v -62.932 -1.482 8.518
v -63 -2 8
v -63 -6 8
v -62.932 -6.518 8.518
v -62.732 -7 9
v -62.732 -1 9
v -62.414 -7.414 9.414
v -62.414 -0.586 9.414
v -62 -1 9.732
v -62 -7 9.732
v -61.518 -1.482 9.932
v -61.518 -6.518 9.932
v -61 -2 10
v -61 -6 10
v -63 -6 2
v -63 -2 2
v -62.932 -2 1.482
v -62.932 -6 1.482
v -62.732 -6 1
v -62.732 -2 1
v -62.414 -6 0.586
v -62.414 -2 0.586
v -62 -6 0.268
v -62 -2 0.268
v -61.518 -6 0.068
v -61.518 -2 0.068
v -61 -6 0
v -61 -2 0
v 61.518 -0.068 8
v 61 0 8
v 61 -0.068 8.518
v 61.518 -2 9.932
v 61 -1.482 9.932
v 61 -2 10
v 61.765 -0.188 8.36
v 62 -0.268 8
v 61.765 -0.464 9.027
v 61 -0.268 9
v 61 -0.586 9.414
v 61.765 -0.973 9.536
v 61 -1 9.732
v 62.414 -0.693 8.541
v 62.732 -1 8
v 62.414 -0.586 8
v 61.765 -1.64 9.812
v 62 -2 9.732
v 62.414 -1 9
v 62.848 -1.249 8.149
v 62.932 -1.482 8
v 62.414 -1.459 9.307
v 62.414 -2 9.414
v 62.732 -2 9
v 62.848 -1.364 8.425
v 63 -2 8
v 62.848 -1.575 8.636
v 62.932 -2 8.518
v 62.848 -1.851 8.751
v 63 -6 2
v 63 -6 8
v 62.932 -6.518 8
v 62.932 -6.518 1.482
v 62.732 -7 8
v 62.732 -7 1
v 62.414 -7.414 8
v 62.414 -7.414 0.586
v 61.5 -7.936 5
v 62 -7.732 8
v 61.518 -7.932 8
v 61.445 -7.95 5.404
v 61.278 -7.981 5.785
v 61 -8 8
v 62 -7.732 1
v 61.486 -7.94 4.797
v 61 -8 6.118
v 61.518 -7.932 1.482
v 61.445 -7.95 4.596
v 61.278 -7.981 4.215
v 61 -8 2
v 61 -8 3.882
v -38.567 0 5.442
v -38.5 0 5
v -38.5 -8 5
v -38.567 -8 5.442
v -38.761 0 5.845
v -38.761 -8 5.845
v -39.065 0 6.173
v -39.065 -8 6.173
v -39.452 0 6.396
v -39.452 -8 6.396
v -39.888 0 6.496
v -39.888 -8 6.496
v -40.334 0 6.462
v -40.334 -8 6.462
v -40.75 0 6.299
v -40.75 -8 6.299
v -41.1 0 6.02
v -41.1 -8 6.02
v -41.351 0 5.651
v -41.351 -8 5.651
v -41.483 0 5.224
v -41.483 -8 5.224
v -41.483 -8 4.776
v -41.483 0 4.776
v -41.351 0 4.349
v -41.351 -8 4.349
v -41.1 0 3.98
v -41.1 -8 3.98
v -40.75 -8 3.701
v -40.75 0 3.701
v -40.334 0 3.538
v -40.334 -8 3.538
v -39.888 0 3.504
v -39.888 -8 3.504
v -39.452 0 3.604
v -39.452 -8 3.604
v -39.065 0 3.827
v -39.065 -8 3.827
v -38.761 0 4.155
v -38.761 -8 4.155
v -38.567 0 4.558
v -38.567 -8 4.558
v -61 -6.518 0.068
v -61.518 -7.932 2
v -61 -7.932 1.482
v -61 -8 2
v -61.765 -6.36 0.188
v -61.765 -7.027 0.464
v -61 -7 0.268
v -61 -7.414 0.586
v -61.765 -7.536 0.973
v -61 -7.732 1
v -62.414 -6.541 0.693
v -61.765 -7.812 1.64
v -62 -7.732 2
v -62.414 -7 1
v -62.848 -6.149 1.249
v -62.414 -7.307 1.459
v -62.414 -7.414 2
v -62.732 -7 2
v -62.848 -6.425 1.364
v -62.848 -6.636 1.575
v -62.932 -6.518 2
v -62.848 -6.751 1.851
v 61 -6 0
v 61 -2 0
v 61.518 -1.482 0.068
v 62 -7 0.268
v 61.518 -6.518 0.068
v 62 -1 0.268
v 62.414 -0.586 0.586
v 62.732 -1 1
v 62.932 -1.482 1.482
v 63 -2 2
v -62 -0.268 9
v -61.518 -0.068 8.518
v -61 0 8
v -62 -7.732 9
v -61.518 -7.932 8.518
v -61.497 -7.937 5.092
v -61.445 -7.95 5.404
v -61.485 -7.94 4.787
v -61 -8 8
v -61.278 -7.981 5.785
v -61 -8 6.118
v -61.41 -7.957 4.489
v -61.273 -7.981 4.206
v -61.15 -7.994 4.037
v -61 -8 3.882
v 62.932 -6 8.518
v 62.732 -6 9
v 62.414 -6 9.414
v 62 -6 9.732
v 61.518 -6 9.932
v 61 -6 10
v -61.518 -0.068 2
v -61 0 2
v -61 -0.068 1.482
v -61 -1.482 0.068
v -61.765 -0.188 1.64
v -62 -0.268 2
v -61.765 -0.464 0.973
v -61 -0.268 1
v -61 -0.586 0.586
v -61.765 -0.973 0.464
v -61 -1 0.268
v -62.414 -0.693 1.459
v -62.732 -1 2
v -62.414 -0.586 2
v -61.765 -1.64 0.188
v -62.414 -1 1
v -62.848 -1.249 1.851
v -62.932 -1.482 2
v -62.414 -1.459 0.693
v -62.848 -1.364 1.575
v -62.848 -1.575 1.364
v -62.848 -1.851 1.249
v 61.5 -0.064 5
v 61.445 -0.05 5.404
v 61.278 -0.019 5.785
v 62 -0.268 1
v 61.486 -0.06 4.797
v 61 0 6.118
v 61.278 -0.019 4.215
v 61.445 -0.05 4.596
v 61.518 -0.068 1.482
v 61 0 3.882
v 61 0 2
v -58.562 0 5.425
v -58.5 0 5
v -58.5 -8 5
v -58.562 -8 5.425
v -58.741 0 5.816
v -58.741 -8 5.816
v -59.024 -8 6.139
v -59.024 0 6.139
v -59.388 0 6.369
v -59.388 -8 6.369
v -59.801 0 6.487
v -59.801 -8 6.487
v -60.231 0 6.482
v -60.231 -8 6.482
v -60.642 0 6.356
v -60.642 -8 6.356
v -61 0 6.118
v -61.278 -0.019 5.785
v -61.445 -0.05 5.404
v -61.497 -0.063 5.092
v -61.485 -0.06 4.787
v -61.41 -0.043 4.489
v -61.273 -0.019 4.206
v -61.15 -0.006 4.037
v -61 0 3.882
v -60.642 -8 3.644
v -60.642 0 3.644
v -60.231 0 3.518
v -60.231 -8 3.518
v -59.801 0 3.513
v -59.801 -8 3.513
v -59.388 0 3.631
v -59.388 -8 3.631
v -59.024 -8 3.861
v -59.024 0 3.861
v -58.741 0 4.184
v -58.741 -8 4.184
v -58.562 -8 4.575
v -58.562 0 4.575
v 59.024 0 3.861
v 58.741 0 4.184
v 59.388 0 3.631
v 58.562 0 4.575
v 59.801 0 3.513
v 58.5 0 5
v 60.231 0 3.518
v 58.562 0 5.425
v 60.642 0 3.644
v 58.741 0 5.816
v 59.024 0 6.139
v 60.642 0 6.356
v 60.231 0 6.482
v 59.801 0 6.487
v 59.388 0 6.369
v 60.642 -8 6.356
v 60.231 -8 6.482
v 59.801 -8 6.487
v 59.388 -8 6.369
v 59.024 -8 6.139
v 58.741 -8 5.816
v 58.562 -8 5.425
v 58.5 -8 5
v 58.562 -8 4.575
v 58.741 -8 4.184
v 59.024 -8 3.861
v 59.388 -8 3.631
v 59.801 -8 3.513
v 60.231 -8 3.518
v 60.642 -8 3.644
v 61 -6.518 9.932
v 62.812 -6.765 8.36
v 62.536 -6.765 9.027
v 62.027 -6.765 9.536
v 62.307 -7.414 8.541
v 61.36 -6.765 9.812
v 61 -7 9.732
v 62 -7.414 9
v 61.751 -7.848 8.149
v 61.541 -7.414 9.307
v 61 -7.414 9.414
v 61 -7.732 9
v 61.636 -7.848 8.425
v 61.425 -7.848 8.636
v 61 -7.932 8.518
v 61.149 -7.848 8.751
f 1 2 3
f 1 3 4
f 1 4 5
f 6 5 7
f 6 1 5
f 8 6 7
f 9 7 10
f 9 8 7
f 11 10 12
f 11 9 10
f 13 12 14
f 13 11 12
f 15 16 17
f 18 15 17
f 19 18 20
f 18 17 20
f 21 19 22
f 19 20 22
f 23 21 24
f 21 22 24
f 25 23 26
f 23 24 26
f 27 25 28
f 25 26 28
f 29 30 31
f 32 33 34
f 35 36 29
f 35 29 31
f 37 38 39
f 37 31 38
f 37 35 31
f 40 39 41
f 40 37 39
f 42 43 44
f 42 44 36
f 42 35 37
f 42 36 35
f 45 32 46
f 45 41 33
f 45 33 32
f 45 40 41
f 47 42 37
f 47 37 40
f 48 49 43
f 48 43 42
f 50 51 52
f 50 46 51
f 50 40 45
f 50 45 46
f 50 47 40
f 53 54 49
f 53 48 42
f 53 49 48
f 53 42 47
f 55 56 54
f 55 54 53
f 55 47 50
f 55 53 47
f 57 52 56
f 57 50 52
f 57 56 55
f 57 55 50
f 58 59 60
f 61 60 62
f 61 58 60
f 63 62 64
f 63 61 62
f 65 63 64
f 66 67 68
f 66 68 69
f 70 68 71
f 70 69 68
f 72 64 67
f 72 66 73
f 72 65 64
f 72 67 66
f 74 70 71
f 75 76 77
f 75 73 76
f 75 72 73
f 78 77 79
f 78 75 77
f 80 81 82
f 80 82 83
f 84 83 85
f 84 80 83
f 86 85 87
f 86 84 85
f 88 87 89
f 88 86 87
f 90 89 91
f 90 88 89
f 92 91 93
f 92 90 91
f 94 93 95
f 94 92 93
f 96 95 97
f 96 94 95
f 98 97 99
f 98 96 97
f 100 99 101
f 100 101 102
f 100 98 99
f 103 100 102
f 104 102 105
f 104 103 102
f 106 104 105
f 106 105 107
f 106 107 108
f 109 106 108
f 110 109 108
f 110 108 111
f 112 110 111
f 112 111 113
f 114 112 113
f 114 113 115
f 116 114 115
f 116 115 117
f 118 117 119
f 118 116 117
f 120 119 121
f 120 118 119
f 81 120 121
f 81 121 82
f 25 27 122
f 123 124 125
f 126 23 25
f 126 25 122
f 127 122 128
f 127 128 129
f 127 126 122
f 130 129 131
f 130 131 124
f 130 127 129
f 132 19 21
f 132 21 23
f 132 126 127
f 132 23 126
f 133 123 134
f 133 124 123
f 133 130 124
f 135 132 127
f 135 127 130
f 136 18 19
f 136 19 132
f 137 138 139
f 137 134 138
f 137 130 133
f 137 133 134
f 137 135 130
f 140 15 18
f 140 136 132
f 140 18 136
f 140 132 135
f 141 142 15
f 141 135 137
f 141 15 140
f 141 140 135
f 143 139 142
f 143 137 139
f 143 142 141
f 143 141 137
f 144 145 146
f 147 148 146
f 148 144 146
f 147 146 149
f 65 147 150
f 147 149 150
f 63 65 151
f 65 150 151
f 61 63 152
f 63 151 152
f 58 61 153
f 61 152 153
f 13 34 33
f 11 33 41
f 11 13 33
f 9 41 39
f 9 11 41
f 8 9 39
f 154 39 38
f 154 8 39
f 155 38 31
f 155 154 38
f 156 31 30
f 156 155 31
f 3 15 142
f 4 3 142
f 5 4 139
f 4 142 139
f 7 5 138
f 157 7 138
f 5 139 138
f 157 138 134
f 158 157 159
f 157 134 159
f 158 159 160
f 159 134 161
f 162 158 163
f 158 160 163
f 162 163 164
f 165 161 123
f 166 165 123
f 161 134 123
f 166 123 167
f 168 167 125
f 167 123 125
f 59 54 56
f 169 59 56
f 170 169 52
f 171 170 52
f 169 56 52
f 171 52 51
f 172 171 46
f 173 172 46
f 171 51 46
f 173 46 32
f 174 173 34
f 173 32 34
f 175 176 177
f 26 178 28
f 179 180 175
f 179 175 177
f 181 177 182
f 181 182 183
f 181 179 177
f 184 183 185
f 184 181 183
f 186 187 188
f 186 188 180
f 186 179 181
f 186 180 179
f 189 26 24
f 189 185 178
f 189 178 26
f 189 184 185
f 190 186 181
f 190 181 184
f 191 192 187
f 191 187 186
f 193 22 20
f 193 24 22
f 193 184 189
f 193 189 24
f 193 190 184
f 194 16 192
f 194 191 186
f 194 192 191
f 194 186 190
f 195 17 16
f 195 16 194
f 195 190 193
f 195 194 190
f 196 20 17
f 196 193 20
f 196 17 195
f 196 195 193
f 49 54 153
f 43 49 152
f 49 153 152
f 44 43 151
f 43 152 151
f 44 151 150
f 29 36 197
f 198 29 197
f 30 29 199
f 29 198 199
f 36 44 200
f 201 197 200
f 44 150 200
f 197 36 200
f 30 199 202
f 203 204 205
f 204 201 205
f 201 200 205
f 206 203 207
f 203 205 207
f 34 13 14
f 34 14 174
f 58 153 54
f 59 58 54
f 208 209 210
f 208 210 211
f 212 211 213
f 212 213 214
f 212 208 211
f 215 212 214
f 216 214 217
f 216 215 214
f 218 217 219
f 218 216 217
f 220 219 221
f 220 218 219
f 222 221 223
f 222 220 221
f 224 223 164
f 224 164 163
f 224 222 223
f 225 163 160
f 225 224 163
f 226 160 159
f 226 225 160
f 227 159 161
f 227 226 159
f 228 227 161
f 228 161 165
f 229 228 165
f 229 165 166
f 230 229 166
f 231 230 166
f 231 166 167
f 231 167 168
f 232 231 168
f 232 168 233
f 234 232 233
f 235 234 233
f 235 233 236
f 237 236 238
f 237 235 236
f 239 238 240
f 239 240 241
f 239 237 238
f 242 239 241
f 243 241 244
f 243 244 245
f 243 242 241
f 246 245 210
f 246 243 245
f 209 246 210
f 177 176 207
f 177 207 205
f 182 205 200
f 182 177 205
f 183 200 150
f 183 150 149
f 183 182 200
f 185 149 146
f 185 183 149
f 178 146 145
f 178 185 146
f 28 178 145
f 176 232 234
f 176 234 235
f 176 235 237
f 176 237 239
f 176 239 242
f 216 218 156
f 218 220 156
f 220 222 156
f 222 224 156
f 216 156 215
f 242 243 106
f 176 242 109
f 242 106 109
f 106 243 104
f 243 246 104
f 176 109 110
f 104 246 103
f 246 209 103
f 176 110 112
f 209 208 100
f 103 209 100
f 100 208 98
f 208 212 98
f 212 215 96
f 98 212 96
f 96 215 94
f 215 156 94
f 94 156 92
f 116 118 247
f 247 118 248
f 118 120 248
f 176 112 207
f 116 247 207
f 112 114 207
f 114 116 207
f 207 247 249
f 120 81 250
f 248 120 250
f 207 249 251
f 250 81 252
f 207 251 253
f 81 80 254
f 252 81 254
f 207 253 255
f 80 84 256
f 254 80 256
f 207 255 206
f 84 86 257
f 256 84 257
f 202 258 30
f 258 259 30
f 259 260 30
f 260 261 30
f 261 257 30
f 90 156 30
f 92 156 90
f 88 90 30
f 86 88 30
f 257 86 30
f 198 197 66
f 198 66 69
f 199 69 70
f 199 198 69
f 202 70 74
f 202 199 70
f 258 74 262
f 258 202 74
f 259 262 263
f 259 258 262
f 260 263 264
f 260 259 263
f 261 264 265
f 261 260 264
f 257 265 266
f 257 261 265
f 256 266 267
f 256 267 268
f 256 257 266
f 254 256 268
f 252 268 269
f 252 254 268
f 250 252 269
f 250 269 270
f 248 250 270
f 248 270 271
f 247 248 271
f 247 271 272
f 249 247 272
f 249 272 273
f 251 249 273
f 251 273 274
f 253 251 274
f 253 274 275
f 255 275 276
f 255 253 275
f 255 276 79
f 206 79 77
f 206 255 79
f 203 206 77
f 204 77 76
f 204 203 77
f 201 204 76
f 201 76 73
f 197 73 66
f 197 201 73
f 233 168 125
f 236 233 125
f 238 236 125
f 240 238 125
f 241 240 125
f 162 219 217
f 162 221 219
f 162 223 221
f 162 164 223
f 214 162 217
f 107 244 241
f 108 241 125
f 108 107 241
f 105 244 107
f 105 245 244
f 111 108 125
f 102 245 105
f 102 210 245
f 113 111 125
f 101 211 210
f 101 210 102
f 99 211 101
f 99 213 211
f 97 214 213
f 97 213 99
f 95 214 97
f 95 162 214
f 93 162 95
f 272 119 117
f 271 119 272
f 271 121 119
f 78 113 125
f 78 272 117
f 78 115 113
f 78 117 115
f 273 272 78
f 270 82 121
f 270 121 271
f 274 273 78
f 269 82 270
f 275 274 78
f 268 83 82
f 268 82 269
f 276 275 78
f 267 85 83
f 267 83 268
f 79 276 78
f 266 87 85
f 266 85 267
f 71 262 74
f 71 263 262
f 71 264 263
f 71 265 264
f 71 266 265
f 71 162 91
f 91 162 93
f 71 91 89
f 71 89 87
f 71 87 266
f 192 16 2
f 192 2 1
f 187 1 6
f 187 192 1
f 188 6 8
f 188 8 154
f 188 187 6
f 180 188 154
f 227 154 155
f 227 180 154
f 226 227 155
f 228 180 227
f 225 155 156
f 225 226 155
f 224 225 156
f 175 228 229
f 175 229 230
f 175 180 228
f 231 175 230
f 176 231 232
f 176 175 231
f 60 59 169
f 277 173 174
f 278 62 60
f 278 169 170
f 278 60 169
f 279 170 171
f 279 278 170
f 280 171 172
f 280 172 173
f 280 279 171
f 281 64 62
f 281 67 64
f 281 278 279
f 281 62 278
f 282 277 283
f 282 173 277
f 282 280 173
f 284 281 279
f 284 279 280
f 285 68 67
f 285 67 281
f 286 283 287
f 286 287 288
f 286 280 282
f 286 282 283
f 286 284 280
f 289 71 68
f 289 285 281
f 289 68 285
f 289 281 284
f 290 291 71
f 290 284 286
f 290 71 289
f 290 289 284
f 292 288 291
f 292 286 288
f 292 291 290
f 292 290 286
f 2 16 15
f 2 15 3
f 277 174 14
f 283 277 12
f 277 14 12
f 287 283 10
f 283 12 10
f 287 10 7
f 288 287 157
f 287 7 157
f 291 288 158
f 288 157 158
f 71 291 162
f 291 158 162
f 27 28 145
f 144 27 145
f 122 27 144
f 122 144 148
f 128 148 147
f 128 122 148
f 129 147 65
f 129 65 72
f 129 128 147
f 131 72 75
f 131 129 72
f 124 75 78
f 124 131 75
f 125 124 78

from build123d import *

# Parameters (mm, degrees)
F0_W         = 126
F0_H         = 10
F0_R         = 1.5
F1_DEPTH     = 8
F2_T1_DEPTH  = 4
F2_T3_DEPTH  = 18
F2_T5_DEPTH  = 129
F2_T7_DEPTH  = 13
F2_S11_W     = 2
F2_S11_H     = 2
F2_T12_DEPTH = 2
F2_S17_W     = 2
F2_S17_H     = 2
F2_T18_DEPTH = 2
F3_T1_DEPTH  = 11
F3_T3_DEPTH  = 4
F3_T5_DEPTH  = 127
F3_S9_W      = 2.04
F3_S9_H      = 2.04
F3_T10_DEPTH = 2.04
F3_S15_W     = 2.04
F3_S15_H     = 2.04
F3_T16_DEPTH = 2.04


# Not quite as in the source:
# - a fillet or chamfer that OpenCascade refuses, or shapes differently, is made with other operations: its cross-section is extruded or revolved along the edge and cut away or added


with BuildPart() as f1:
    # F0 (on Front) → F1 (new body)
    with BuildSketch(Plane.XZ):
        with Locations((0, 5)):
            Rectangle(F0_W, F0_H)
        with Locations((-60, 5)):
            Circle(F0_R, mode=Mode.SUBTRACT)
        with Locations((-40, 5)):
            Circle(F0_R, mode=Mode.SUBTRACT)
        with Locations((60, 5)):
            Circle(F0_R, mode=Mode.SUBTRACT)
    extrude(amount=F1_DEPTH)

    # F2: fillet of radius 2 on 7 edges, made by hand

    # F2_s2 → F2_t1 (cut)
    with BuildSketch(Plane.XZ.offset(2)):
        with BuildLine():
            ThreePointArc((63, 8), (62.4142135624, 9.4142135624), (61, 10))
            Line((61, 10), (63, 10))
            Line((63, 10), (63, 8))
        make_face()
    extrude(amount=F2_T1_DEPTH, mode=Mode.SUBTRACT)

    # F2_s4 → F2_t3 (cut)
    with BuildSketch(Plane.XZ.offset(-5)):
        with BuildLine():
            ThreePointArc((-63, 8), (-62.4142135624, 9.4142135624), (-61, 10))
            Line((-61, 10), (-63, 10))
            Line((-63, 10), (-63, 8))
        make_face()
        with BuildLine():
            ThreePointArc((61, 0), (62.4142135624, 0.5857864376), (63, 2))
            Line((63, 2), (63, 0))
            Line((63, 0), (61, 0))
        make_face()
    extrude(amount=F2_T3_DEPTH, mode=Mode.SUBTRACT)

    # F2_s6 → F2_t5 (cut)
    with BuildSketch(Plane.YZ.offset(-68)):
        with BuildLine():
            ThreePointArc((-2, 10), (-0.5857864376, 9.4142135624), (0, 8))
            Line((0, 8), (0, 10))
            Line((0, 10), (-2, 10))
        make_face()
        with BuildLine():
            ThreePointArc((-6, 10), (-7.4142135624, 9.4142135624), (-8, 8))
            Line((-8, 8), (-8, 10))
            Line((-8, 10), (-6, 10))
        make_face()
    extrude(amount=F2_T5_DEPTH, mode=Mode.SUBTRACT)

    # F2_s8 → F2_t7 (cut)
    with BuildSketch(Plane.XY.offset(-5)):
        with BuildLine():
            ThreePointArc((63, -2), (62.4142135624, -0.5857864376), (61, 0))
            Line((61, 0), (63, 0))
            Line((63, 0), (63, -2))
        make_face()
        with BuildLine():
            ThreePointArc((63, -6), (62.4142135624, -7.4142135624), (61, -8))
            Line((61, -8), (63, -8))
            Line((63, -8), (63, -6))
        make_face()
    extrude(amount=F2_T7_DEPTH, mode=Mode.SUBTRACT)


with BuildPart() as f2_tool10:
    # F2_s11 → F2_t12 (new body)
    with BuildSketch(Plane.YZ.offset(61)):
        with Locations((-1, 9)):
            Rectangle(F2_S11_W, F2_S11_H)
    extrude(amount=F2_T12_DEPTH)

    # F2_s13 → F2_t14 (revolve, cut)
    with BuildSketch(Plane(origin=(61, -2, 8), x_dir=(0, -0.7071067812, -0.7071067812), z_dir=(0, -0.7071067812, 0.7071067812))):
        with BuildLine():
            ThreePointArc((0, -2), (2, 0), (0, 2))
            Line((0, 2), (0, -2))
        make_face()
    revolve(axis=Axis((61, -2, 8), (1, 0, 0)), mode=Mode.SUBTRACT)


with BuildPart() as f1_1:
    add(f1.part)

    # F2_t9: cut F2_tool10
    add(f2_tool10.part, mode=Mode.SUBTRACT)


with BuildPart() as f2_tool16:
    # F2_s17 → F2_t18 (new body)
    with BuildSketch(Plane.XZ.offset(6)):
        with Locations((62, 9)):
            Rectangle(F2_S17_W, F2_S17_H)
    extrude(amount=F2_T18_DEPTH)

    # F2_s19 → F2_t20 (revolve, cut)
    with BuildSketch(Plane(origin=(61, -6, 8), x_dir=(-0.7071067812, 0, -0.7071067812), z_dir=(-0.7071067812, 0, 0.7071067812))):
        with BuildLine():
            ThreePointArc((0, -2), (2, 0), (0, 2))
            Line((0, 2), (0, -2))
        make_face()
    revolve(axis=Axis((61, -6, 8), (0, -1, 0)), mode=Mode.SUBTRACT)


with BuildPart() as f1_2:
    add(f1_1.part)

    # F2_t15: cut F2_tool16
    add(f2_tool16.part, mode=Mode.SUBTRACT)

    # F3: fillet of radius 2 on 7 edges, made by hand

    # F3_s2 → F3_t1 (cut)
    with BuildSketch(Plane.XY.offset(2)):
        with BuildLine():
            ThreePointArc((-63, -2), (-62.4142135624, -0.5857864376), (-61, 0))
            Line((-61, 0), (-63, 0))
            Line((-63, 0), (-63, -2))
        make_face()
        with BuildLine():
            ThreePointArc((-63, -6), (-62.4142135624, -7.4142135624), (-61, -8))
            Line((-61, -8), (-63, -8))
            Line((-63, -8), (-63, -6))
        make_face()
    extrude(amount=F3_T1_DEPTH, mode=Mode.SUBTRACT)

    # F3_s4 → F3_t3 (cut)
    with BuildSketch(Plane.XZ.offset(2)):
        with BuildLine():
            ThreePointArc((-63, 2), (-62.4142135624, 0.5857864376), (-61, 0))
            Line((-61, 0), (-63, 0))
            Line((-63, 0), (-63, 2))
        make_face()
    extrude(amount=F3_T3_DEPTH, mode=Mode.SUBTRACT)

    # F3_s6 → F3_t5 (cut)
    with BuildSketch(Plane.YZ.offset(-61)):
        with BuildLine():
            ThreePointArc((0, 2), (-0.5857864376, 0.5857864376), (-2, 0))
            Line((-2, 0), (0, 0))
            Line((0, 0), (0, 2))
        make_face()
        with BuildLine():
            ThreePointArc((-6, 0), (-7.4142135624, 0.5857864376), (-8, 2))
            Line((-8, 2), (-8, 0))
            Line((-8, 0), (-6, 0))
        make_face()
    extrude(amount=F3_T5_DEPTH, mode=Mode.SUBTRACT)


with BuildPart() as f3_tool8:
    # F3_s9 → F3_t10 (new body)
    with BuildSketch(Plane.YZ.offset(-61)):
        with Locations((-0.98, 0.98)):
            Rectangle(F3_S9_W, F3_S9_H)
    extrude(amount=-F3_T10_DEPTH)

    # F3_s11 → F3_t12 (revolve, cut)
    with BuildSketch(Plane(origin=(-61, -2, 2), x_dir=(0, -0.7071067812, 0.7071067812), z_dir=(0, -0.7071067812, -0.7071067812))):
        with BuildLine():
            ThreePointArc((0, -2), (2, 0), (0, 2))
            Line((0, 2), (0, -2))
        make_face()
    revolve(axis=Axis((-61, -2, 2), (-1, 0, 0)), mode=Mode.SUBTRACT)


with BuildPart() as f1_3:
    add(f1_2.part)

    # F3_t7: cut F3_tool8
    add(f3_tool8.part, mode=Mode.SUBTRACT)


with BuildPart() as f3_tool14:
    # F3_s15 → F3_t16 (new body)
    with BuildSketch(Plane.YZ.offset(-61)):
        with Locations((-7.02, 0.98)):
            Rectangle(F3_S15_W, F3_S15_H)
    extrude(amount=-F3_T16_DEPTH)

    # F3_s17 → F3_t18 (revolve, cut)
    with BuildSketch(Plane(origin=(-61, -6, 2), x_dir=(0, 0.7071067812, 0.7071067812), z_dir=(0, -0.7071067812, 0.7071067812))):
        with BuildLine():
            ThreePointArc((0, -2), (2, 0), (0, 2))
            Line((0, 2), (0, -2))
        make_face()
    revolve(axis=Axis((-61, -6, 2), (-1, 0, 0)), mode=Mode.SUBTRACT)


with BuildPart() as f1_4:
    add(f1_3.part)

    # F3_t13: cut F3_tool14
    add(f3_tool14.part, mode=Mode.SUBTRACT)


solid = f1_4.part
